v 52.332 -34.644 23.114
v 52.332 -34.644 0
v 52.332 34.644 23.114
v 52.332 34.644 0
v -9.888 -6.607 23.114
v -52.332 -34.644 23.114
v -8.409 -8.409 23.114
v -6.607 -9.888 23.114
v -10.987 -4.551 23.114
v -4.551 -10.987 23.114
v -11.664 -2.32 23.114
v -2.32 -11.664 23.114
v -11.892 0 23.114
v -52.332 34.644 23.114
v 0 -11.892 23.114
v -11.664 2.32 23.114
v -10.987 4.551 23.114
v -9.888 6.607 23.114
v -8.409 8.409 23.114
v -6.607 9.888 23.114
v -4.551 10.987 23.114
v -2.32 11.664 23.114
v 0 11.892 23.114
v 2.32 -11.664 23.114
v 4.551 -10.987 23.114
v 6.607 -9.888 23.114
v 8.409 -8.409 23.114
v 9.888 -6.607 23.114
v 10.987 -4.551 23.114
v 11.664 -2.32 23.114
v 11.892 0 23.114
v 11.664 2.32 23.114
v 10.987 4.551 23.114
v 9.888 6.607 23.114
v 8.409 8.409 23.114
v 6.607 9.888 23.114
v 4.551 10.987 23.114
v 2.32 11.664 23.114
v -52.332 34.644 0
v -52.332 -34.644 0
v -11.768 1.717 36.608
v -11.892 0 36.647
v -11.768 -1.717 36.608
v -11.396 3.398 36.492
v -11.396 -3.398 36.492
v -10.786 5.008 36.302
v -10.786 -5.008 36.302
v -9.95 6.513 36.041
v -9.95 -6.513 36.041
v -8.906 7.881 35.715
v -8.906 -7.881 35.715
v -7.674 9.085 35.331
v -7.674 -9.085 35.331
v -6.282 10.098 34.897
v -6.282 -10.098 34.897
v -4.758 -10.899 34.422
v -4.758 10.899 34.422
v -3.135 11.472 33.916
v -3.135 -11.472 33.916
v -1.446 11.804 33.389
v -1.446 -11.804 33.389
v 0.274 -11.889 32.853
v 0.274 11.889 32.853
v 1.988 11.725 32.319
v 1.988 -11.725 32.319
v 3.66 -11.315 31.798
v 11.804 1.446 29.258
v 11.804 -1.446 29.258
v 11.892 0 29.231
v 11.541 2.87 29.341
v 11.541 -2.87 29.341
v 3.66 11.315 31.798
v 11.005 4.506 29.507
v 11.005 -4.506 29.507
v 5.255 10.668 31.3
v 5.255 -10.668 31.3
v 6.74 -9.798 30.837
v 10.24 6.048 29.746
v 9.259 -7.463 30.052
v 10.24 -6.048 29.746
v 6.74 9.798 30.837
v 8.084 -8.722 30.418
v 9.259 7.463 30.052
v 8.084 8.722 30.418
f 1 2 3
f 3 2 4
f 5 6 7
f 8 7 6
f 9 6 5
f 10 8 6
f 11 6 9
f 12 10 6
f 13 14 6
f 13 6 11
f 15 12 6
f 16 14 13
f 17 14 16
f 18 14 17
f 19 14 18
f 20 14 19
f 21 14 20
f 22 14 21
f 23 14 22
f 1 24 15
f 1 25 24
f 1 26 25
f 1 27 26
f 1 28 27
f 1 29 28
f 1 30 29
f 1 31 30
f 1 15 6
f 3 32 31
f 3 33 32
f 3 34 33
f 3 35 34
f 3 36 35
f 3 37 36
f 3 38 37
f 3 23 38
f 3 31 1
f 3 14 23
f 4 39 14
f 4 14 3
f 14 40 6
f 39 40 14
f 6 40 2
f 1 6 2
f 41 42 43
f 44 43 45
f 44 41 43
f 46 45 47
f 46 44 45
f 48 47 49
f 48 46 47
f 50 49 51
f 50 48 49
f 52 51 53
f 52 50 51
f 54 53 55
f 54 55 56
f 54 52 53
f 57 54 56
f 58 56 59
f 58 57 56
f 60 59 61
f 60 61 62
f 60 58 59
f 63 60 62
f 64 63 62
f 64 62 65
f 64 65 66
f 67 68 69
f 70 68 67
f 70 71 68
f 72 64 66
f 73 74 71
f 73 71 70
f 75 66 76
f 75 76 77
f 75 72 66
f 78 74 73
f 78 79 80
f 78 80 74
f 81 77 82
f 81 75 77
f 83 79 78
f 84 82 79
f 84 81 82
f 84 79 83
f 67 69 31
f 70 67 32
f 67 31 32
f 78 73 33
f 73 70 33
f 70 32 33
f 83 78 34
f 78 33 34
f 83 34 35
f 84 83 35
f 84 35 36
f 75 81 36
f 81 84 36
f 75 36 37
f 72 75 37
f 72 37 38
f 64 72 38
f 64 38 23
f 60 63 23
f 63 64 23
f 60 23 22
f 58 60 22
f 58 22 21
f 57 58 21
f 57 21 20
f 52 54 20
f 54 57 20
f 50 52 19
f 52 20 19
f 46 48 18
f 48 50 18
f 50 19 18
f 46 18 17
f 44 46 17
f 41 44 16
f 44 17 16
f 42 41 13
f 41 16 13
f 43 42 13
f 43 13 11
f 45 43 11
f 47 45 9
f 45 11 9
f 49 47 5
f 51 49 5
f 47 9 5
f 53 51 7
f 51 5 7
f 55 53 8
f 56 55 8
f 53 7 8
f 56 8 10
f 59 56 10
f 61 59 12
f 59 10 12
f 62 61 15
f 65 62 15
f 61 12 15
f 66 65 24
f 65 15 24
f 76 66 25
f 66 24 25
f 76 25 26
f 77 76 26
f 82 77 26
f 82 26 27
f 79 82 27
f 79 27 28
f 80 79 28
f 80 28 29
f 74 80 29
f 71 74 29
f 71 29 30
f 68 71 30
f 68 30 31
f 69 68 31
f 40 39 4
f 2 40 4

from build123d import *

# Parameters (mm, degrees)
F0_W     = 104.663714
F0_H     = 69.28701
F1_DEPTH = 23.114
F2_R     = 11.892204
F3_DEPTH = 18.034
F5_DEPTH = 25.4
F6_DEPTH = 25.4


with BuildPart() as f1:
    # F0 (on Top) → F1 (new body)
    with BuildSketch(Plane.XY):
        Rectangle(F0_W, F0_H)
    extrude(amount=F1_DEPTH)

    # F2 (on face) → F3 (join)
    with BuildSketch(Plane.XY.offset(23.114)):
        Circle(F2_R)
    extrude(amount=F3_DEPTH)

    # F4 (on Front) → F5 (cut)
    with BuildSketch(Plane.XZ):
        Polygon((20.987732, 43.441858), (-27.219897, 41.425567), (20.987732, 26.395051), align=None)
    extrude(amount=-F5_DEPTH, mode=Mode.SUBTRACT)

    # F4 (on Front) → F6 (cut)
    with BuildSketch(Plane.XZ):
        Polygon((20.987732, 43.441858), (-27.219897, 41.425567), (20.987732, 26.395051), align=None)
    extrude(amount=F6_DEPTH, mode=Mode.SUBTRACT)


solid = f1.part
